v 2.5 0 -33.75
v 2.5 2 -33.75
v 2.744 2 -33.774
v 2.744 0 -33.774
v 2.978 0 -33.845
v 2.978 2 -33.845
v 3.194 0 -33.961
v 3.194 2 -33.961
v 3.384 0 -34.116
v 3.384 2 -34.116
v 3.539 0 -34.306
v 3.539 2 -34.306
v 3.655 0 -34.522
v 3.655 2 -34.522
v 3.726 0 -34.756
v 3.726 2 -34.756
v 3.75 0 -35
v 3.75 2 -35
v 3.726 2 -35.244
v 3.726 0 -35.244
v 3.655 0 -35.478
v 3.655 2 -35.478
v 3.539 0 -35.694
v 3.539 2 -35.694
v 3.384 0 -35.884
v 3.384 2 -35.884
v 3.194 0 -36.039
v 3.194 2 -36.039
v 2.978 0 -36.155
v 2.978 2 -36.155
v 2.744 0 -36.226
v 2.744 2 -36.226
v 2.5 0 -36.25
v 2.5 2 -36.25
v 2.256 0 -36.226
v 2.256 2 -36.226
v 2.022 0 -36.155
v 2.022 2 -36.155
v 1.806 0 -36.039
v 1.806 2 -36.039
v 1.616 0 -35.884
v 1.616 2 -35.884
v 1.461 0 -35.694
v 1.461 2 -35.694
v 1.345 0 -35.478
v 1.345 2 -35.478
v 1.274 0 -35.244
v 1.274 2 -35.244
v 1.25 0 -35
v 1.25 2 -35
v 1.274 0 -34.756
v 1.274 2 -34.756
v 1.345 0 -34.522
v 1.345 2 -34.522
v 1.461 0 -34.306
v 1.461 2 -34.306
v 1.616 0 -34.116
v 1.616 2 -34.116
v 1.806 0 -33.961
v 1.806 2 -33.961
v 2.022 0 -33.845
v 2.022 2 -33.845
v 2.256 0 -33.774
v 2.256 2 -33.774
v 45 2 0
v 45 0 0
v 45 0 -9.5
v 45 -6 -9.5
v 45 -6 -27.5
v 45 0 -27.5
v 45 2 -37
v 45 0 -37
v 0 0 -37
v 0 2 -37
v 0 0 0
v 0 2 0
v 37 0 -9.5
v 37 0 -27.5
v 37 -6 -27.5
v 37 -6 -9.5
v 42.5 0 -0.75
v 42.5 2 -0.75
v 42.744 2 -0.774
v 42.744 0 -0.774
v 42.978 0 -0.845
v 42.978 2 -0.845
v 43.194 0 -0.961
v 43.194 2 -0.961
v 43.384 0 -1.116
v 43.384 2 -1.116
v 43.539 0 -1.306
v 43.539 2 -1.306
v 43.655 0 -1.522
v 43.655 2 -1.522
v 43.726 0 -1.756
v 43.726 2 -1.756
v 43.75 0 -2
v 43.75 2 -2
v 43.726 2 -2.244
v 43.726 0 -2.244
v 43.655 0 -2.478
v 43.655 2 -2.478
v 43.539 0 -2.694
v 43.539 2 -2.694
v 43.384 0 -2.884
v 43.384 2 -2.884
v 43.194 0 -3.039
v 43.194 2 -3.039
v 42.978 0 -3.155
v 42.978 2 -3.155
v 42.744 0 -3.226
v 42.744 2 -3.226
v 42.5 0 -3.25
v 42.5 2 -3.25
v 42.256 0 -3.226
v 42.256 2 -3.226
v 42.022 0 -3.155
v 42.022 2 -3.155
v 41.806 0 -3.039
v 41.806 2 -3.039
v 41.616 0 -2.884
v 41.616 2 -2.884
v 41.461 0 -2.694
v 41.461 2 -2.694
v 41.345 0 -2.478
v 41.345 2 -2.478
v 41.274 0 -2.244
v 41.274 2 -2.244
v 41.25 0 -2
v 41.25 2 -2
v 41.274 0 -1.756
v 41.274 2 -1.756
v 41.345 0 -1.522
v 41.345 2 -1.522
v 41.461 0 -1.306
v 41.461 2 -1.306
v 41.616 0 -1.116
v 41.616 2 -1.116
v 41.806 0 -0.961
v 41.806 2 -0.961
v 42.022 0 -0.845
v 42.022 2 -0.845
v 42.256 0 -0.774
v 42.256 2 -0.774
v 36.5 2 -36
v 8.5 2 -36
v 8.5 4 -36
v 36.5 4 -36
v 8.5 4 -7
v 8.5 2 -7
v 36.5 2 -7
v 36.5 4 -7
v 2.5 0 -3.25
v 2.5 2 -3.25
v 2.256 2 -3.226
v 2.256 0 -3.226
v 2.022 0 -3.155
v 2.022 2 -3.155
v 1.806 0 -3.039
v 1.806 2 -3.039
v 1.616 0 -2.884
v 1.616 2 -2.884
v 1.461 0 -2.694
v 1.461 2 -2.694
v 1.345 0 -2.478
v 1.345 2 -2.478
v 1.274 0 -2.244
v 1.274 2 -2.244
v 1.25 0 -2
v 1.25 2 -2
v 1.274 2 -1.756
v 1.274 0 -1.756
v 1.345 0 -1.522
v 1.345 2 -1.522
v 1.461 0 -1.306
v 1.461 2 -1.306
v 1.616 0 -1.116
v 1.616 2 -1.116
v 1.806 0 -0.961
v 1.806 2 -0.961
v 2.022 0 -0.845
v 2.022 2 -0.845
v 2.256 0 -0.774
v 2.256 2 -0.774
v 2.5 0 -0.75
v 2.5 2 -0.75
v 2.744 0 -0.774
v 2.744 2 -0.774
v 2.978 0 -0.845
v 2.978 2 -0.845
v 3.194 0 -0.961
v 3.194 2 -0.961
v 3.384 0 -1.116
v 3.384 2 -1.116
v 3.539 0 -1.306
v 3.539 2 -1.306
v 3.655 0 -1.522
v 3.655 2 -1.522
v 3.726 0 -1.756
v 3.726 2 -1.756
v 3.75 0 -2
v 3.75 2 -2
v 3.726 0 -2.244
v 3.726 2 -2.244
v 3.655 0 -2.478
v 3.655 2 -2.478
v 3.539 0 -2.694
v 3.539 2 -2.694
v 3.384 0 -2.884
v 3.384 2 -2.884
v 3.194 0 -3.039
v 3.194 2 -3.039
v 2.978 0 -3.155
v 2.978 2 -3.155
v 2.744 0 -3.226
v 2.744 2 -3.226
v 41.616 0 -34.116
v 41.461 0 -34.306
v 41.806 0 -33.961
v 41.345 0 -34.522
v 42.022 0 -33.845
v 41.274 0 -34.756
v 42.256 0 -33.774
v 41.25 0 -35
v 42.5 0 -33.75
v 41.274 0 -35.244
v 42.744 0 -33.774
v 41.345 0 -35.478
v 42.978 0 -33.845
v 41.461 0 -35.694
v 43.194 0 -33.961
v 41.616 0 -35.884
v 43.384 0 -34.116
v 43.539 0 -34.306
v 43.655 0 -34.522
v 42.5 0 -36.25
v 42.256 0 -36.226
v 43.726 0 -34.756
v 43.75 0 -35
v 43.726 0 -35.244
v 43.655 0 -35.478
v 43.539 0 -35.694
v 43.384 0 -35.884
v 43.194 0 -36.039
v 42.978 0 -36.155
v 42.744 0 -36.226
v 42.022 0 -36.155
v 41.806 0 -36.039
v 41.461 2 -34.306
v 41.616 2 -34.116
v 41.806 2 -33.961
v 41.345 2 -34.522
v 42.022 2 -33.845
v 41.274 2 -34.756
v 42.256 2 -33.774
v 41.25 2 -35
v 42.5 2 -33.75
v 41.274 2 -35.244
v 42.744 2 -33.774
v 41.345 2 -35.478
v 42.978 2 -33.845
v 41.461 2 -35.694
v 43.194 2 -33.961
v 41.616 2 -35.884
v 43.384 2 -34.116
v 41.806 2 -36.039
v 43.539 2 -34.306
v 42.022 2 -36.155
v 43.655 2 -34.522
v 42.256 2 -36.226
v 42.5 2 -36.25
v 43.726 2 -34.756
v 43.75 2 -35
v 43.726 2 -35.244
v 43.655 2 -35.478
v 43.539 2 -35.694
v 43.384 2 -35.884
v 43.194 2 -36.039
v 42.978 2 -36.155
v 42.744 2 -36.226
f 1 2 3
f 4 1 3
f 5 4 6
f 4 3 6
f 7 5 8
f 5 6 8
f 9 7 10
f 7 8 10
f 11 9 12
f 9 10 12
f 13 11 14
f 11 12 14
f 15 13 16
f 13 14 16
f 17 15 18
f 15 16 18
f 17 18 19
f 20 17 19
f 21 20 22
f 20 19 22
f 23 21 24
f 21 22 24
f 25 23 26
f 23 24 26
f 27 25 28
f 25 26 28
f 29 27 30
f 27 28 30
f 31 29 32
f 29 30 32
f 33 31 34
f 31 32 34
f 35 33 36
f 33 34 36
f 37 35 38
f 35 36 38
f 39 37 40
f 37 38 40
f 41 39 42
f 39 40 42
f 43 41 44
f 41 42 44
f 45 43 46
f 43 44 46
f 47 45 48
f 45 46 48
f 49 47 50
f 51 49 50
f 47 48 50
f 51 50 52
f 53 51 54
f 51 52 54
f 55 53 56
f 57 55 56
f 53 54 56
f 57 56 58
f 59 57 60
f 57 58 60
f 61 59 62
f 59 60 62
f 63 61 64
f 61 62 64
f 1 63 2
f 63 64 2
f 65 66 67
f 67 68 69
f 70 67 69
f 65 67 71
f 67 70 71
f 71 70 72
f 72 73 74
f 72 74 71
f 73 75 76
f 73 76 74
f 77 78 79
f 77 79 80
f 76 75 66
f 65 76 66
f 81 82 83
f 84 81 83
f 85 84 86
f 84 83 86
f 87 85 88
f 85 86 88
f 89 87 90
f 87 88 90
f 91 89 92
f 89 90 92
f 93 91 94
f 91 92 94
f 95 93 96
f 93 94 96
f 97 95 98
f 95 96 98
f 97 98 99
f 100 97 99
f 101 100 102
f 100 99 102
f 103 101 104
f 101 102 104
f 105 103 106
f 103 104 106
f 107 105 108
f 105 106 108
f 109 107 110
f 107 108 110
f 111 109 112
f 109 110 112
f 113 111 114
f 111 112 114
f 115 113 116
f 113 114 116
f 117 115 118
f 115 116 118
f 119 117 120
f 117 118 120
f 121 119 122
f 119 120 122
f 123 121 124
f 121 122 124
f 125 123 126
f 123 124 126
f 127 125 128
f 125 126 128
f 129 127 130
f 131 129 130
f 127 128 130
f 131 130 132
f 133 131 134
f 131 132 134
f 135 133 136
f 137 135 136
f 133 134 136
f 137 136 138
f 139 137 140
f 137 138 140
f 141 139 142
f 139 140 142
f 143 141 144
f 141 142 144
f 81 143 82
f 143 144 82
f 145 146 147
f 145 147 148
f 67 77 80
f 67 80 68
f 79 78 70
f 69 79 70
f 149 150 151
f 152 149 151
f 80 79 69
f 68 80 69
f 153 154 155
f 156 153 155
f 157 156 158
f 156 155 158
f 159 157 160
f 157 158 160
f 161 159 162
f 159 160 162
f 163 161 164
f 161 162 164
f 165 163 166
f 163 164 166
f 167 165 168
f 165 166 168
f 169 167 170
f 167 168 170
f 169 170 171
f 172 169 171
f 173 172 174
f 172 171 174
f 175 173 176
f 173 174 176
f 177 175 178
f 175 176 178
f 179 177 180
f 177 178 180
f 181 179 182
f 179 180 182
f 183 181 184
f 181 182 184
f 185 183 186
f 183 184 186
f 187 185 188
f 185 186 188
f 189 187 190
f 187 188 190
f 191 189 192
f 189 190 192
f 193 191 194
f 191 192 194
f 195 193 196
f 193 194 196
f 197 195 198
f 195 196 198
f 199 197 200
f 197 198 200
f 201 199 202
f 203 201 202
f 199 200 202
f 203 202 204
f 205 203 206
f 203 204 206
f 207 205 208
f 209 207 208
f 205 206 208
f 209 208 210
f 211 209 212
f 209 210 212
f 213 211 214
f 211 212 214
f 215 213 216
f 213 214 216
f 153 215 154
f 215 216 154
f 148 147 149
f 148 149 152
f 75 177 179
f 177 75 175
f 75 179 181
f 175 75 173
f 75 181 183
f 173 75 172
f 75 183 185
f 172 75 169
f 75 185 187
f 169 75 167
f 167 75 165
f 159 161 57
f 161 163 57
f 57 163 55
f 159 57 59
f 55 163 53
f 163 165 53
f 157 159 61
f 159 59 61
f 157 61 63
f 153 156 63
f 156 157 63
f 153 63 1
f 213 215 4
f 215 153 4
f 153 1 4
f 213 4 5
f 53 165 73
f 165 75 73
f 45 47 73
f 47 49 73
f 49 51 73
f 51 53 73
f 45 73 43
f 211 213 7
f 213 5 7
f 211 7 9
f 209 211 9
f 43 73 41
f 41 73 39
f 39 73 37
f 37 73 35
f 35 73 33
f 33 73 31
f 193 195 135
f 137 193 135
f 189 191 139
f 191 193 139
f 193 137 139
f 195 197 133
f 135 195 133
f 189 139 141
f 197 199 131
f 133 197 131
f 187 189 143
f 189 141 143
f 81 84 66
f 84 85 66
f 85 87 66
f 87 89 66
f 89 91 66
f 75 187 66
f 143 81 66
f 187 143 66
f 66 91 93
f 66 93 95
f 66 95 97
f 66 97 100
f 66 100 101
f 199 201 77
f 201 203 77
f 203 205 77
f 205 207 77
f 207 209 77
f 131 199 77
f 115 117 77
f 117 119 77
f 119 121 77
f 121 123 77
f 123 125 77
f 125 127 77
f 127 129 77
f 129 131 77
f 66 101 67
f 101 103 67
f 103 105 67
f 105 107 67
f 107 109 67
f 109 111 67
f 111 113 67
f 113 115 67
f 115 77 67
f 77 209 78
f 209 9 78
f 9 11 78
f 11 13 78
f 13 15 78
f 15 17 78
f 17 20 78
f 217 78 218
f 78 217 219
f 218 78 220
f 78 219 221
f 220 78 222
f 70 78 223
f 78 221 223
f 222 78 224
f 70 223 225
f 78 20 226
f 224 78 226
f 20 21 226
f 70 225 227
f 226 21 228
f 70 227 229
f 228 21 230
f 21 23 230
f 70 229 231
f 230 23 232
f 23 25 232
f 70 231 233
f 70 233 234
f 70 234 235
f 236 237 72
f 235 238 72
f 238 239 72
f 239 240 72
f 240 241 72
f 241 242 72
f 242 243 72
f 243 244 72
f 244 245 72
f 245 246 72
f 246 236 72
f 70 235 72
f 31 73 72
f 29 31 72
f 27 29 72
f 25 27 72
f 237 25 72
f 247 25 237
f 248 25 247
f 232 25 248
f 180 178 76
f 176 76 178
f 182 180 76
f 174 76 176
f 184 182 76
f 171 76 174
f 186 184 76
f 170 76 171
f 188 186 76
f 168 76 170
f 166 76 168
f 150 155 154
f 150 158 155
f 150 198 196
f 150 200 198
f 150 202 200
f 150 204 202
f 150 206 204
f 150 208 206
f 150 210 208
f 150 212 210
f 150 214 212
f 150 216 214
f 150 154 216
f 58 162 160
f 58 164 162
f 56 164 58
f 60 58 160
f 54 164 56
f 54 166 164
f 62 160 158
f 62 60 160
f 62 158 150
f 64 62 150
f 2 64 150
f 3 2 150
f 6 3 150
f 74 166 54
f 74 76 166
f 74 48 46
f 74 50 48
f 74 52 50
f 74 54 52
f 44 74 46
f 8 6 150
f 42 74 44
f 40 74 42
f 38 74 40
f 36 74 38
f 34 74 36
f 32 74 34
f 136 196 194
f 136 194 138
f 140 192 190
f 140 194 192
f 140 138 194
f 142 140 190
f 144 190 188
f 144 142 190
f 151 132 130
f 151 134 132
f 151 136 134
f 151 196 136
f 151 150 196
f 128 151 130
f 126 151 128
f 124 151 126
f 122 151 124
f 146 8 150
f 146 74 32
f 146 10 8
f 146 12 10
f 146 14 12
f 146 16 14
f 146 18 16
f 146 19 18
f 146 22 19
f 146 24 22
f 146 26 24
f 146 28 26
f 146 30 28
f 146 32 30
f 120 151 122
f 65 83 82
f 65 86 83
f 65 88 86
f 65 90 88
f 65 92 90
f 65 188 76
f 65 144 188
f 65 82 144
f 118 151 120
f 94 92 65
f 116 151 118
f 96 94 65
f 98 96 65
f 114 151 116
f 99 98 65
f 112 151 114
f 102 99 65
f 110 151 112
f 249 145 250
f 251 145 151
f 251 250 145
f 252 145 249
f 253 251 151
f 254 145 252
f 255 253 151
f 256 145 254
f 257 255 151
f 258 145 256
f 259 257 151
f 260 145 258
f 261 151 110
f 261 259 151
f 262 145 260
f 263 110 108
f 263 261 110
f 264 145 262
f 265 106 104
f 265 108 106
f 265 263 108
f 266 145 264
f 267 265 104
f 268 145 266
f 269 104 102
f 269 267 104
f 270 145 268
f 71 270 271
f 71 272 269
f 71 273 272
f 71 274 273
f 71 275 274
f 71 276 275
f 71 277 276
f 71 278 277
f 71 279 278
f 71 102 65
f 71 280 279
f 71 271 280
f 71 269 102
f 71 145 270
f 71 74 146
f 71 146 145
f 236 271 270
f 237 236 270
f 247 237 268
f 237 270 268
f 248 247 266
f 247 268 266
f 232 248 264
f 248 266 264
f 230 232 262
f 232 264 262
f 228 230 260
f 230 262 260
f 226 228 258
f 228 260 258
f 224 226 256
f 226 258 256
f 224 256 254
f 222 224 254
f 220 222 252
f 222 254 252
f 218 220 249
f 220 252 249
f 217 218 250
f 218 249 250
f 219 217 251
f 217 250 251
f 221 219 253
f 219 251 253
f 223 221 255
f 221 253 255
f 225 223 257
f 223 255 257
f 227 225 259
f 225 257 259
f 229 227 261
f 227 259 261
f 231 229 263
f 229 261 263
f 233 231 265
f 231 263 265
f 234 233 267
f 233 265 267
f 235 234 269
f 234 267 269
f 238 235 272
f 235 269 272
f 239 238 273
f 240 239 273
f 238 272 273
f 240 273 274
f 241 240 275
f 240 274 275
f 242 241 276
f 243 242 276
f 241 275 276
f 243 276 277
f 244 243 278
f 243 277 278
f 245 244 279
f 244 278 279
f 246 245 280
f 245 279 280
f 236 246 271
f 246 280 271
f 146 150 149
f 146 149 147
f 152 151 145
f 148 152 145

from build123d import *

# Parameters (mm, degrees)
SKETCH_1_W          = 45
SKETCH_1_H          = 37
EXTRUDE_1_DEPTH     = 2
SKETCH_2_W          = 28
SKETCH_2_H          = 29
EXTRUDE_2_DEPTH     = 2
SKETCH_3_R          = 1.25
CUT_EXTRUDE_1_DEPTH = 2
SKETCH_4_W          = 8
SKETCH_4_H          = 18
EXTRUDE_3_DEPTH     = 6


with BuildPart() as part:
    # 草图1 → 凸台-拉伸1 (new body)
    with BuildSketch(Plane(origin=(0, 0, 0), x_dir=(1, 0, 0), z_dir=(0, 1, 0))):
        with Locations((22.5, 18.5)):
            Rectangle(SKETCH_1_W, SKETCH_1_H)
    extrude(amount=EXTRUDE_1_DEPTH)

    # 草图2 → 凸台-拉伸2 (add)
    with BuildSketch(Plane(origin=(0, 2, 0), x_dir=(1, 0, 0), z_dir=(0, 1, 0))):
        with Locations((22.5, 21.5)):
            Rectangle(SKETCH_2_W, SKETCH_2_H)
    extrude(amount=EXTRUDE_2_DEPTH)

    # 草图3 → 切除-拉伸1 (cut)
    with BuildSketch(Plane(origin=(0, 2, 0), x_dir=(1, 0, 0), z_dir=(0, 1, 0))):
        with Locations(Location((2.5, 35, 0), (0, 0, 270))):
            Circle(SKETCH_3_R)
        with Locations(Location((42.5, 35, 0), (0, 0, 90))):
            Circle(SKETCH_3_R)
        with Locations(Location((42.5, 2, 0), (0, 0, 270))):
            Circle(SKETCH_3_R)
        with Locations(Location((2.5, 2, 0), (0, 0, 90))):
            Circle(SKETCH_3_R)
    extrude(amount=-CUT_EXTRUDE_1_DEPTH, mode=Mode.SUBTRACT)

    # 草图4 → 凸台-拉伸3 (add)
    with BuildSketch(Plane.XZ):
        with Locations((41, -18.5)):
            Rectangle(SKETCH_4_W, SKETCH_4_H)
    extrude(amount=EXTRUDE_3_DEPTH)


solid = part.part
